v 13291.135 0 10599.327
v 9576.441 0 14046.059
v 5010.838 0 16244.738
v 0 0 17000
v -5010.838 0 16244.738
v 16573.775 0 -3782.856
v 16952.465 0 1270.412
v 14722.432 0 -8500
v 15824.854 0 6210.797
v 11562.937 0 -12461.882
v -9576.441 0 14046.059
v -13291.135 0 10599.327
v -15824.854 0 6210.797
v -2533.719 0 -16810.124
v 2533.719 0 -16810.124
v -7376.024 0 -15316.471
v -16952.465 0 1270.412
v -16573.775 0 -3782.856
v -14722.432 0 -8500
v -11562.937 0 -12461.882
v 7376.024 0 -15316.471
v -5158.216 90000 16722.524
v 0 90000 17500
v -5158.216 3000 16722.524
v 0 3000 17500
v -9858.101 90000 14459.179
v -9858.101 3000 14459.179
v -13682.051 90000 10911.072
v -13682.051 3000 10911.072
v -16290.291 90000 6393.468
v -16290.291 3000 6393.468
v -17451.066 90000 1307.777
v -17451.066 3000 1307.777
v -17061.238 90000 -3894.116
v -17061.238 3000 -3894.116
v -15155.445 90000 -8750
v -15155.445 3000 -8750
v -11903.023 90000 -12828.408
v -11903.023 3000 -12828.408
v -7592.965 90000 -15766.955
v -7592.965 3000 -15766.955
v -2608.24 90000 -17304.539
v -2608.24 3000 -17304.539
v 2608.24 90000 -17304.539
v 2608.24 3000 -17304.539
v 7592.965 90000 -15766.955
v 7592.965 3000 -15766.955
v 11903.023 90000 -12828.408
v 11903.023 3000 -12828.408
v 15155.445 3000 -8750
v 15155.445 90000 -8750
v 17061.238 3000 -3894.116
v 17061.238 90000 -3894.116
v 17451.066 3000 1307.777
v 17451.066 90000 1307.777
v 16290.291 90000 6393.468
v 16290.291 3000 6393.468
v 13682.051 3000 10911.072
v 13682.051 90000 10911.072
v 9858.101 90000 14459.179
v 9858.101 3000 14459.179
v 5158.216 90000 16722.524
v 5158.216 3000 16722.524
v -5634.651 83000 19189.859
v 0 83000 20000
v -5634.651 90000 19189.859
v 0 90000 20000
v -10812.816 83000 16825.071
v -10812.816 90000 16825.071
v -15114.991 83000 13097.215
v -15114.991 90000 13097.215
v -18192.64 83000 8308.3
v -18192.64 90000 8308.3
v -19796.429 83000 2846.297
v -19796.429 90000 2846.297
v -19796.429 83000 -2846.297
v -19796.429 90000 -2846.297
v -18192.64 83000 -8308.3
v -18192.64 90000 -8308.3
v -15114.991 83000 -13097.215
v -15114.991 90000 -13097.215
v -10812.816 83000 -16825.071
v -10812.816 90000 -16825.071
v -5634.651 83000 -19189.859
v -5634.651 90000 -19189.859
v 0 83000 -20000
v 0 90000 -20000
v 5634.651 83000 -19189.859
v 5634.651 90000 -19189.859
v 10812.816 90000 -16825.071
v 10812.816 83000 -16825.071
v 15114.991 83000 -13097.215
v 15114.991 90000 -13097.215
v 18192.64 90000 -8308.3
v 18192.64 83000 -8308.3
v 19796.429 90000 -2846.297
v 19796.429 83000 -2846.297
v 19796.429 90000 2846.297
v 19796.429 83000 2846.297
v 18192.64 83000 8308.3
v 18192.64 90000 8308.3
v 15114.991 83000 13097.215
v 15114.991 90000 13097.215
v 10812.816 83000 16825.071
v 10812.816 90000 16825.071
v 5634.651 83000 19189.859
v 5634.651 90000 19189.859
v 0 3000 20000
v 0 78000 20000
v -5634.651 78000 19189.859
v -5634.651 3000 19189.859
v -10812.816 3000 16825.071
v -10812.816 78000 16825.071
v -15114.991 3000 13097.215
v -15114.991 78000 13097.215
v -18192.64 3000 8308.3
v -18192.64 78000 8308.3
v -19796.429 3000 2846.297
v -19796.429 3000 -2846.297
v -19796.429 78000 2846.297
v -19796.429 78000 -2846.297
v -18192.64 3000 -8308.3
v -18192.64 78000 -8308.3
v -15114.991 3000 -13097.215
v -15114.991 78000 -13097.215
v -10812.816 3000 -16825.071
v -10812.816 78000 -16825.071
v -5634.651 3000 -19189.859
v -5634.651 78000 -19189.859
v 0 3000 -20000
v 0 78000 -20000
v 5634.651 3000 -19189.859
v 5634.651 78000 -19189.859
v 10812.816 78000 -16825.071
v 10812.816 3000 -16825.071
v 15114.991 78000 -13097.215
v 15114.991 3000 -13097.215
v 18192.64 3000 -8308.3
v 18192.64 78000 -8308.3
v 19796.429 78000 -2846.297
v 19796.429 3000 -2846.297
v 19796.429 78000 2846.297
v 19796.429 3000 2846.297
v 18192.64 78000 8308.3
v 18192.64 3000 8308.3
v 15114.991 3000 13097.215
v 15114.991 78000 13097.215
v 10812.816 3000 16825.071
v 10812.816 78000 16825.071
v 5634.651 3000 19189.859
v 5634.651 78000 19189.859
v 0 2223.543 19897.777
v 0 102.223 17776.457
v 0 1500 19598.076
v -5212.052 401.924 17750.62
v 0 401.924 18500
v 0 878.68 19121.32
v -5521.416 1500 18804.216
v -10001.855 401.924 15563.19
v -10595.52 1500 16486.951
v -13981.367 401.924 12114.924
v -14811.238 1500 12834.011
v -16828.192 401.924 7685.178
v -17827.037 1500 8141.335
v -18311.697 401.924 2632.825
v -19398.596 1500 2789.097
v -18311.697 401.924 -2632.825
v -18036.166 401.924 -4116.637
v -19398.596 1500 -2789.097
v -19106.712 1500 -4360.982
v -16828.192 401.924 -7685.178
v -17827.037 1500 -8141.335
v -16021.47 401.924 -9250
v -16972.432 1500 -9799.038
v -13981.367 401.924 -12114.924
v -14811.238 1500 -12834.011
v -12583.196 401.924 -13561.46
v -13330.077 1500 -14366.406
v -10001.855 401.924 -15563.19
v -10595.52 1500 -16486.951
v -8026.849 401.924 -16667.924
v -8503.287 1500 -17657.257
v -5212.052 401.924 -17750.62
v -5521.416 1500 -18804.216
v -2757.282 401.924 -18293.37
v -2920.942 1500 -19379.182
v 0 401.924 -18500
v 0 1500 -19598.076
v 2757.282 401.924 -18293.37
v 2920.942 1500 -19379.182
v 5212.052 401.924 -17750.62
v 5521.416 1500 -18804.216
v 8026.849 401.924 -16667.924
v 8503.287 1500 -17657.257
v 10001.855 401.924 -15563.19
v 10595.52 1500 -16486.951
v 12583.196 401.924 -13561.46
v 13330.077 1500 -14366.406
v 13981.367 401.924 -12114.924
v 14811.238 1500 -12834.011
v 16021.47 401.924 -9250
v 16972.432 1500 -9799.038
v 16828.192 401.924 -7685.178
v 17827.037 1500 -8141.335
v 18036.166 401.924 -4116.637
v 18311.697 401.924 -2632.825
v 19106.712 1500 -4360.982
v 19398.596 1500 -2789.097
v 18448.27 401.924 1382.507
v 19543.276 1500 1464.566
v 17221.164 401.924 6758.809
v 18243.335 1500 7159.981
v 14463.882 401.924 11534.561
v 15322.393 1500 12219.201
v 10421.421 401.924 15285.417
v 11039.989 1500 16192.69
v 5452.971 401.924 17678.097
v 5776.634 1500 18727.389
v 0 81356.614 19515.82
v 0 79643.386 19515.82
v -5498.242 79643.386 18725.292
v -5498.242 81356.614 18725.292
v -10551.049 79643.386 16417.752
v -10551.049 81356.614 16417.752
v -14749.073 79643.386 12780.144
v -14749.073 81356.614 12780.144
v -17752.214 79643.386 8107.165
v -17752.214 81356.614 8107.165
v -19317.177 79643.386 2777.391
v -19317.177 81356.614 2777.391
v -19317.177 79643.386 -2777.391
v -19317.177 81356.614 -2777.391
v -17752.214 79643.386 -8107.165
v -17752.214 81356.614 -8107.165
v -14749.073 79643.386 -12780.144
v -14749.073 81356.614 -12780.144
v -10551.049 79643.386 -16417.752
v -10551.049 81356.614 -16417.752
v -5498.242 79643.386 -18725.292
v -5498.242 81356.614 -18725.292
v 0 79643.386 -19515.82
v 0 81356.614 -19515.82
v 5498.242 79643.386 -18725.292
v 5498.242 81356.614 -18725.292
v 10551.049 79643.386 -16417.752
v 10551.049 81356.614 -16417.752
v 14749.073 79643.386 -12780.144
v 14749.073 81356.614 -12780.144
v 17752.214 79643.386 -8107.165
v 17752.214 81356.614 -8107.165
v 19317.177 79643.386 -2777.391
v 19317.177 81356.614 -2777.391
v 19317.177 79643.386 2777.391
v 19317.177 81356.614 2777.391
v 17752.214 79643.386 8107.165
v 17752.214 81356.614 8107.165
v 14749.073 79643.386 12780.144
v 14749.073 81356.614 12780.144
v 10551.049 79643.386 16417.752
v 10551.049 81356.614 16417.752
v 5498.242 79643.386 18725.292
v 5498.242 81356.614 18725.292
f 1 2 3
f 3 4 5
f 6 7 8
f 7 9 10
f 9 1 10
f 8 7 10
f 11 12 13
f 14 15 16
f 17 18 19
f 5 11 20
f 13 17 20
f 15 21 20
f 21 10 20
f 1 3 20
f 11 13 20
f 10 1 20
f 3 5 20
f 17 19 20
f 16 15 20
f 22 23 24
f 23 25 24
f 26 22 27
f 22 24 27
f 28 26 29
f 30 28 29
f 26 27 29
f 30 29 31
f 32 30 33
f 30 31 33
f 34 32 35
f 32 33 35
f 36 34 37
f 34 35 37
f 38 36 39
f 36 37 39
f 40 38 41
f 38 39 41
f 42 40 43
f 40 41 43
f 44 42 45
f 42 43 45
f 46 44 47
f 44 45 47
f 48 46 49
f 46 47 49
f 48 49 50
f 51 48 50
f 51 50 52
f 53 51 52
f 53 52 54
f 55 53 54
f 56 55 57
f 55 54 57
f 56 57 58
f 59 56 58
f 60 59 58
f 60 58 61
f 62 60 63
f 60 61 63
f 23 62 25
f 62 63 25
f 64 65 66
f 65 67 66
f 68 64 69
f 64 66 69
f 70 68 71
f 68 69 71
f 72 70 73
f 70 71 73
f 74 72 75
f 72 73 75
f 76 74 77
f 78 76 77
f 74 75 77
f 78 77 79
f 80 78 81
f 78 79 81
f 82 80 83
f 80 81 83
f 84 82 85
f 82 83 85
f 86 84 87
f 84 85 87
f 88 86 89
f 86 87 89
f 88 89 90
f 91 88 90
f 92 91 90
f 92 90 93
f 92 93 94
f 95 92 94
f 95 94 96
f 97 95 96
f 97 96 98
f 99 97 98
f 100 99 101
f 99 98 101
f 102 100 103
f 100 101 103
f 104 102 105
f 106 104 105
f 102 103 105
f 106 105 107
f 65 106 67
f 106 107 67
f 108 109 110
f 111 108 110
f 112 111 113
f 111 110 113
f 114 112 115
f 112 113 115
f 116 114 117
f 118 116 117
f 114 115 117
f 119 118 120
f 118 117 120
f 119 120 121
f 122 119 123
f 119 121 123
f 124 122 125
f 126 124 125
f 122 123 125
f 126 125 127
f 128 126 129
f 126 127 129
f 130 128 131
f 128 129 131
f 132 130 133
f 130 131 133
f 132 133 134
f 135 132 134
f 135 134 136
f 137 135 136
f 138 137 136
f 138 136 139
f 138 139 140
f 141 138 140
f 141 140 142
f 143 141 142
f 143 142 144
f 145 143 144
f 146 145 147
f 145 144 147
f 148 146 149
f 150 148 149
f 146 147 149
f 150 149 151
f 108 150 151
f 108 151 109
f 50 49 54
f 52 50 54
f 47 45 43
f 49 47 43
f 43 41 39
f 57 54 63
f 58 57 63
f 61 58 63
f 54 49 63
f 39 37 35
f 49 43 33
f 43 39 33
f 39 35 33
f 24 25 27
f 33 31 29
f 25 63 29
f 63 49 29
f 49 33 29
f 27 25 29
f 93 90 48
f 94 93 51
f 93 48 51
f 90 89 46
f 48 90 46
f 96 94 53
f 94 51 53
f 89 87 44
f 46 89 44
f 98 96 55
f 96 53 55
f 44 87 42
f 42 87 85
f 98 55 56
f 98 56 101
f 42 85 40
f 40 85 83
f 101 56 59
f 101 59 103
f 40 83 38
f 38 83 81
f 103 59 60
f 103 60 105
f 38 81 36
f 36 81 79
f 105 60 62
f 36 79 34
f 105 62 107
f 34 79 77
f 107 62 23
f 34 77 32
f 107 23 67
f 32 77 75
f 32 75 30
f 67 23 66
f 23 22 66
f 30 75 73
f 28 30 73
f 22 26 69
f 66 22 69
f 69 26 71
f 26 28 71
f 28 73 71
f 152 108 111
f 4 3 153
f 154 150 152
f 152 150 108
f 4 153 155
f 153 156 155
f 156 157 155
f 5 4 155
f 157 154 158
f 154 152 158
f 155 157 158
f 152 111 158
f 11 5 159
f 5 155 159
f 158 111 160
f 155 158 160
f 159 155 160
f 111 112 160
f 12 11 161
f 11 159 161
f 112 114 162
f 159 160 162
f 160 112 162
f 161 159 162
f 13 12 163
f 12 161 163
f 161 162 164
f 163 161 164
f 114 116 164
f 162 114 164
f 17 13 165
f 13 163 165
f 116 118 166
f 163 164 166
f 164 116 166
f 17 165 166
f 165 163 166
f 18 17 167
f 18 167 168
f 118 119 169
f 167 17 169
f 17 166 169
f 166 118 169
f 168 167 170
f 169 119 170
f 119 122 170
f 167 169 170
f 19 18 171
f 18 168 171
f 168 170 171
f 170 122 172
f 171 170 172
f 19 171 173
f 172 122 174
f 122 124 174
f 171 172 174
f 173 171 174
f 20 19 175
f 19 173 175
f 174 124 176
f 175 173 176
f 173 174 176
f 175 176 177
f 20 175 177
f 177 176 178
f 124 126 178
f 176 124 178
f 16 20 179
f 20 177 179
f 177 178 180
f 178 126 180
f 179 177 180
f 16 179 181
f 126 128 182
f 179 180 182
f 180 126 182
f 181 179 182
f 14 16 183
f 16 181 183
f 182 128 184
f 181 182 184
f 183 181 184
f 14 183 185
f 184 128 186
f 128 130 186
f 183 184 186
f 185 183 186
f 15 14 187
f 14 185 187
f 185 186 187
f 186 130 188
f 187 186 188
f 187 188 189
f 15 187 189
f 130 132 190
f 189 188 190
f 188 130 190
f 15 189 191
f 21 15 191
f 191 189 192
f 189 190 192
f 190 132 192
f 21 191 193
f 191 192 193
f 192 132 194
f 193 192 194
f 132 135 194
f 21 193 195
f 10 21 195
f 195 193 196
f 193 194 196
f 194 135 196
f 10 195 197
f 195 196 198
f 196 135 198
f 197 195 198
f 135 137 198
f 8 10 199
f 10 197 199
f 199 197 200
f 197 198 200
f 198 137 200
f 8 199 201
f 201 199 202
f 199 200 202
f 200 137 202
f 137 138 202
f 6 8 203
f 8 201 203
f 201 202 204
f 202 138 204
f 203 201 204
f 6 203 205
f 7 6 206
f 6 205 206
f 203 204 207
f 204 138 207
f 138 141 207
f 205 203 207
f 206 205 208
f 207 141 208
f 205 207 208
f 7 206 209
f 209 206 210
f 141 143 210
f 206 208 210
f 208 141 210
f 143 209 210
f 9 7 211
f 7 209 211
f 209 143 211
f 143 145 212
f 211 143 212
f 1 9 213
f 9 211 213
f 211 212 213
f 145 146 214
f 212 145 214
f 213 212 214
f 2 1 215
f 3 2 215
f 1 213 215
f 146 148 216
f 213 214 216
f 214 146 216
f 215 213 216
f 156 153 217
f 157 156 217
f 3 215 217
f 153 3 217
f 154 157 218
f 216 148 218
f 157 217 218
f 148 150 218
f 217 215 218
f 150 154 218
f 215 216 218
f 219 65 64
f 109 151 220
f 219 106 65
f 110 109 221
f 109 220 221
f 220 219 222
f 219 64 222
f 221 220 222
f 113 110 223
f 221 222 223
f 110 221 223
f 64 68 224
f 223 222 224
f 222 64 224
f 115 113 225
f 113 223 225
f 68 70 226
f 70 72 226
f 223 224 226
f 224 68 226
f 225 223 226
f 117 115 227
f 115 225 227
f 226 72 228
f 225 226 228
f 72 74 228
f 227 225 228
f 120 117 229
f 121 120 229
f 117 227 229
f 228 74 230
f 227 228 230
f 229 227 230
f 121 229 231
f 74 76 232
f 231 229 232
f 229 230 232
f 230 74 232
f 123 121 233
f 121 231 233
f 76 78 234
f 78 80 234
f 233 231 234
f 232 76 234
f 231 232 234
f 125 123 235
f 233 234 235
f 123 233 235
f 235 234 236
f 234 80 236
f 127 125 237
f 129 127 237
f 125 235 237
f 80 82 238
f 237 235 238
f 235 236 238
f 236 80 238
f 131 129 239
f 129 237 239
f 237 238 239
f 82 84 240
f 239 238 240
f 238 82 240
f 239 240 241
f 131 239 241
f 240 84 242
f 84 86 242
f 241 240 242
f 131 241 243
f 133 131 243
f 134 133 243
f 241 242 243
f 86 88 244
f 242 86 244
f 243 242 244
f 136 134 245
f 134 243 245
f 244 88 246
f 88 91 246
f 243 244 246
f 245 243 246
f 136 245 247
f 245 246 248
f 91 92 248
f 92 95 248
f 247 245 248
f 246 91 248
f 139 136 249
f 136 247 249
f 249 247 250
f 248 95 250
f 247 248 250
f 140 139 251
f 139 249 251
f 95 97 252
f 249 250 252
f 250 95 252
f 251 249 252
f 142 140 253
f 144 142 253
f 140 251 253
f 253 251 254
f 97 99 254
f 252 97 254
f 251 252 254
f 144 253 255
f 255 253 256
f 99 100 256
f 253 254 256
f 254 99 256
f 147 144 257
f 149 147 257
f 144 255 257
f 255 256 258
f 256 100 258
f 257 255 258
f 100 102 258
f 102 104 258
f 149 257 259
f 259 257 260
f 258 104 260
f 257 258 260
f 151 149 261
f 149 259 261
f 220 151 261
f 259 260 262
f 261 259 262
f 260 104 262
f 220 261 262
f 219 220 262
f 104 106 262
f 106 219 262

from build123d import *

# Parameters (mm, degrees)
FILLET4_R = 3000


with BuildPart() as part:
    # Sketch7 → Revolve1 (revolve)
    with BuildSketch(Plane.XY, mode=Mode.PRIVATE) as revolve1_sk:
        with BuildLine():
            Line((0, 0), (20000, 0))
            Line((20000, 0), (20000, 78000))
            ThreePointArc((20000, 78000), (19454.356057318, 80500), (20000, 83000))
            Line((20000, 83000), (20000, 90000))
            Line((20000, 90000), (17500, 90000))
            Line((17500, 90000), (17500, 3000))
            Line((17500, 3000), (0, 3000))
            Line((0, 3000), (0, 0))
        make_face()
    revolve(revolve1_sk.sketch.rotate(Axis((0, 3000, 0), (0, -1, 0)), 90), axis=Axis((0, 3000, 0), (0, -1, 0)))

    # Fillet4
    fillet4_edges = [part.edges().sort_by_distance(p)[0] for p in [
        (0, 0, -20000),
    ]]
    fillet(fillet4_edges, radius=FILLET4_R)


solid = part.part
